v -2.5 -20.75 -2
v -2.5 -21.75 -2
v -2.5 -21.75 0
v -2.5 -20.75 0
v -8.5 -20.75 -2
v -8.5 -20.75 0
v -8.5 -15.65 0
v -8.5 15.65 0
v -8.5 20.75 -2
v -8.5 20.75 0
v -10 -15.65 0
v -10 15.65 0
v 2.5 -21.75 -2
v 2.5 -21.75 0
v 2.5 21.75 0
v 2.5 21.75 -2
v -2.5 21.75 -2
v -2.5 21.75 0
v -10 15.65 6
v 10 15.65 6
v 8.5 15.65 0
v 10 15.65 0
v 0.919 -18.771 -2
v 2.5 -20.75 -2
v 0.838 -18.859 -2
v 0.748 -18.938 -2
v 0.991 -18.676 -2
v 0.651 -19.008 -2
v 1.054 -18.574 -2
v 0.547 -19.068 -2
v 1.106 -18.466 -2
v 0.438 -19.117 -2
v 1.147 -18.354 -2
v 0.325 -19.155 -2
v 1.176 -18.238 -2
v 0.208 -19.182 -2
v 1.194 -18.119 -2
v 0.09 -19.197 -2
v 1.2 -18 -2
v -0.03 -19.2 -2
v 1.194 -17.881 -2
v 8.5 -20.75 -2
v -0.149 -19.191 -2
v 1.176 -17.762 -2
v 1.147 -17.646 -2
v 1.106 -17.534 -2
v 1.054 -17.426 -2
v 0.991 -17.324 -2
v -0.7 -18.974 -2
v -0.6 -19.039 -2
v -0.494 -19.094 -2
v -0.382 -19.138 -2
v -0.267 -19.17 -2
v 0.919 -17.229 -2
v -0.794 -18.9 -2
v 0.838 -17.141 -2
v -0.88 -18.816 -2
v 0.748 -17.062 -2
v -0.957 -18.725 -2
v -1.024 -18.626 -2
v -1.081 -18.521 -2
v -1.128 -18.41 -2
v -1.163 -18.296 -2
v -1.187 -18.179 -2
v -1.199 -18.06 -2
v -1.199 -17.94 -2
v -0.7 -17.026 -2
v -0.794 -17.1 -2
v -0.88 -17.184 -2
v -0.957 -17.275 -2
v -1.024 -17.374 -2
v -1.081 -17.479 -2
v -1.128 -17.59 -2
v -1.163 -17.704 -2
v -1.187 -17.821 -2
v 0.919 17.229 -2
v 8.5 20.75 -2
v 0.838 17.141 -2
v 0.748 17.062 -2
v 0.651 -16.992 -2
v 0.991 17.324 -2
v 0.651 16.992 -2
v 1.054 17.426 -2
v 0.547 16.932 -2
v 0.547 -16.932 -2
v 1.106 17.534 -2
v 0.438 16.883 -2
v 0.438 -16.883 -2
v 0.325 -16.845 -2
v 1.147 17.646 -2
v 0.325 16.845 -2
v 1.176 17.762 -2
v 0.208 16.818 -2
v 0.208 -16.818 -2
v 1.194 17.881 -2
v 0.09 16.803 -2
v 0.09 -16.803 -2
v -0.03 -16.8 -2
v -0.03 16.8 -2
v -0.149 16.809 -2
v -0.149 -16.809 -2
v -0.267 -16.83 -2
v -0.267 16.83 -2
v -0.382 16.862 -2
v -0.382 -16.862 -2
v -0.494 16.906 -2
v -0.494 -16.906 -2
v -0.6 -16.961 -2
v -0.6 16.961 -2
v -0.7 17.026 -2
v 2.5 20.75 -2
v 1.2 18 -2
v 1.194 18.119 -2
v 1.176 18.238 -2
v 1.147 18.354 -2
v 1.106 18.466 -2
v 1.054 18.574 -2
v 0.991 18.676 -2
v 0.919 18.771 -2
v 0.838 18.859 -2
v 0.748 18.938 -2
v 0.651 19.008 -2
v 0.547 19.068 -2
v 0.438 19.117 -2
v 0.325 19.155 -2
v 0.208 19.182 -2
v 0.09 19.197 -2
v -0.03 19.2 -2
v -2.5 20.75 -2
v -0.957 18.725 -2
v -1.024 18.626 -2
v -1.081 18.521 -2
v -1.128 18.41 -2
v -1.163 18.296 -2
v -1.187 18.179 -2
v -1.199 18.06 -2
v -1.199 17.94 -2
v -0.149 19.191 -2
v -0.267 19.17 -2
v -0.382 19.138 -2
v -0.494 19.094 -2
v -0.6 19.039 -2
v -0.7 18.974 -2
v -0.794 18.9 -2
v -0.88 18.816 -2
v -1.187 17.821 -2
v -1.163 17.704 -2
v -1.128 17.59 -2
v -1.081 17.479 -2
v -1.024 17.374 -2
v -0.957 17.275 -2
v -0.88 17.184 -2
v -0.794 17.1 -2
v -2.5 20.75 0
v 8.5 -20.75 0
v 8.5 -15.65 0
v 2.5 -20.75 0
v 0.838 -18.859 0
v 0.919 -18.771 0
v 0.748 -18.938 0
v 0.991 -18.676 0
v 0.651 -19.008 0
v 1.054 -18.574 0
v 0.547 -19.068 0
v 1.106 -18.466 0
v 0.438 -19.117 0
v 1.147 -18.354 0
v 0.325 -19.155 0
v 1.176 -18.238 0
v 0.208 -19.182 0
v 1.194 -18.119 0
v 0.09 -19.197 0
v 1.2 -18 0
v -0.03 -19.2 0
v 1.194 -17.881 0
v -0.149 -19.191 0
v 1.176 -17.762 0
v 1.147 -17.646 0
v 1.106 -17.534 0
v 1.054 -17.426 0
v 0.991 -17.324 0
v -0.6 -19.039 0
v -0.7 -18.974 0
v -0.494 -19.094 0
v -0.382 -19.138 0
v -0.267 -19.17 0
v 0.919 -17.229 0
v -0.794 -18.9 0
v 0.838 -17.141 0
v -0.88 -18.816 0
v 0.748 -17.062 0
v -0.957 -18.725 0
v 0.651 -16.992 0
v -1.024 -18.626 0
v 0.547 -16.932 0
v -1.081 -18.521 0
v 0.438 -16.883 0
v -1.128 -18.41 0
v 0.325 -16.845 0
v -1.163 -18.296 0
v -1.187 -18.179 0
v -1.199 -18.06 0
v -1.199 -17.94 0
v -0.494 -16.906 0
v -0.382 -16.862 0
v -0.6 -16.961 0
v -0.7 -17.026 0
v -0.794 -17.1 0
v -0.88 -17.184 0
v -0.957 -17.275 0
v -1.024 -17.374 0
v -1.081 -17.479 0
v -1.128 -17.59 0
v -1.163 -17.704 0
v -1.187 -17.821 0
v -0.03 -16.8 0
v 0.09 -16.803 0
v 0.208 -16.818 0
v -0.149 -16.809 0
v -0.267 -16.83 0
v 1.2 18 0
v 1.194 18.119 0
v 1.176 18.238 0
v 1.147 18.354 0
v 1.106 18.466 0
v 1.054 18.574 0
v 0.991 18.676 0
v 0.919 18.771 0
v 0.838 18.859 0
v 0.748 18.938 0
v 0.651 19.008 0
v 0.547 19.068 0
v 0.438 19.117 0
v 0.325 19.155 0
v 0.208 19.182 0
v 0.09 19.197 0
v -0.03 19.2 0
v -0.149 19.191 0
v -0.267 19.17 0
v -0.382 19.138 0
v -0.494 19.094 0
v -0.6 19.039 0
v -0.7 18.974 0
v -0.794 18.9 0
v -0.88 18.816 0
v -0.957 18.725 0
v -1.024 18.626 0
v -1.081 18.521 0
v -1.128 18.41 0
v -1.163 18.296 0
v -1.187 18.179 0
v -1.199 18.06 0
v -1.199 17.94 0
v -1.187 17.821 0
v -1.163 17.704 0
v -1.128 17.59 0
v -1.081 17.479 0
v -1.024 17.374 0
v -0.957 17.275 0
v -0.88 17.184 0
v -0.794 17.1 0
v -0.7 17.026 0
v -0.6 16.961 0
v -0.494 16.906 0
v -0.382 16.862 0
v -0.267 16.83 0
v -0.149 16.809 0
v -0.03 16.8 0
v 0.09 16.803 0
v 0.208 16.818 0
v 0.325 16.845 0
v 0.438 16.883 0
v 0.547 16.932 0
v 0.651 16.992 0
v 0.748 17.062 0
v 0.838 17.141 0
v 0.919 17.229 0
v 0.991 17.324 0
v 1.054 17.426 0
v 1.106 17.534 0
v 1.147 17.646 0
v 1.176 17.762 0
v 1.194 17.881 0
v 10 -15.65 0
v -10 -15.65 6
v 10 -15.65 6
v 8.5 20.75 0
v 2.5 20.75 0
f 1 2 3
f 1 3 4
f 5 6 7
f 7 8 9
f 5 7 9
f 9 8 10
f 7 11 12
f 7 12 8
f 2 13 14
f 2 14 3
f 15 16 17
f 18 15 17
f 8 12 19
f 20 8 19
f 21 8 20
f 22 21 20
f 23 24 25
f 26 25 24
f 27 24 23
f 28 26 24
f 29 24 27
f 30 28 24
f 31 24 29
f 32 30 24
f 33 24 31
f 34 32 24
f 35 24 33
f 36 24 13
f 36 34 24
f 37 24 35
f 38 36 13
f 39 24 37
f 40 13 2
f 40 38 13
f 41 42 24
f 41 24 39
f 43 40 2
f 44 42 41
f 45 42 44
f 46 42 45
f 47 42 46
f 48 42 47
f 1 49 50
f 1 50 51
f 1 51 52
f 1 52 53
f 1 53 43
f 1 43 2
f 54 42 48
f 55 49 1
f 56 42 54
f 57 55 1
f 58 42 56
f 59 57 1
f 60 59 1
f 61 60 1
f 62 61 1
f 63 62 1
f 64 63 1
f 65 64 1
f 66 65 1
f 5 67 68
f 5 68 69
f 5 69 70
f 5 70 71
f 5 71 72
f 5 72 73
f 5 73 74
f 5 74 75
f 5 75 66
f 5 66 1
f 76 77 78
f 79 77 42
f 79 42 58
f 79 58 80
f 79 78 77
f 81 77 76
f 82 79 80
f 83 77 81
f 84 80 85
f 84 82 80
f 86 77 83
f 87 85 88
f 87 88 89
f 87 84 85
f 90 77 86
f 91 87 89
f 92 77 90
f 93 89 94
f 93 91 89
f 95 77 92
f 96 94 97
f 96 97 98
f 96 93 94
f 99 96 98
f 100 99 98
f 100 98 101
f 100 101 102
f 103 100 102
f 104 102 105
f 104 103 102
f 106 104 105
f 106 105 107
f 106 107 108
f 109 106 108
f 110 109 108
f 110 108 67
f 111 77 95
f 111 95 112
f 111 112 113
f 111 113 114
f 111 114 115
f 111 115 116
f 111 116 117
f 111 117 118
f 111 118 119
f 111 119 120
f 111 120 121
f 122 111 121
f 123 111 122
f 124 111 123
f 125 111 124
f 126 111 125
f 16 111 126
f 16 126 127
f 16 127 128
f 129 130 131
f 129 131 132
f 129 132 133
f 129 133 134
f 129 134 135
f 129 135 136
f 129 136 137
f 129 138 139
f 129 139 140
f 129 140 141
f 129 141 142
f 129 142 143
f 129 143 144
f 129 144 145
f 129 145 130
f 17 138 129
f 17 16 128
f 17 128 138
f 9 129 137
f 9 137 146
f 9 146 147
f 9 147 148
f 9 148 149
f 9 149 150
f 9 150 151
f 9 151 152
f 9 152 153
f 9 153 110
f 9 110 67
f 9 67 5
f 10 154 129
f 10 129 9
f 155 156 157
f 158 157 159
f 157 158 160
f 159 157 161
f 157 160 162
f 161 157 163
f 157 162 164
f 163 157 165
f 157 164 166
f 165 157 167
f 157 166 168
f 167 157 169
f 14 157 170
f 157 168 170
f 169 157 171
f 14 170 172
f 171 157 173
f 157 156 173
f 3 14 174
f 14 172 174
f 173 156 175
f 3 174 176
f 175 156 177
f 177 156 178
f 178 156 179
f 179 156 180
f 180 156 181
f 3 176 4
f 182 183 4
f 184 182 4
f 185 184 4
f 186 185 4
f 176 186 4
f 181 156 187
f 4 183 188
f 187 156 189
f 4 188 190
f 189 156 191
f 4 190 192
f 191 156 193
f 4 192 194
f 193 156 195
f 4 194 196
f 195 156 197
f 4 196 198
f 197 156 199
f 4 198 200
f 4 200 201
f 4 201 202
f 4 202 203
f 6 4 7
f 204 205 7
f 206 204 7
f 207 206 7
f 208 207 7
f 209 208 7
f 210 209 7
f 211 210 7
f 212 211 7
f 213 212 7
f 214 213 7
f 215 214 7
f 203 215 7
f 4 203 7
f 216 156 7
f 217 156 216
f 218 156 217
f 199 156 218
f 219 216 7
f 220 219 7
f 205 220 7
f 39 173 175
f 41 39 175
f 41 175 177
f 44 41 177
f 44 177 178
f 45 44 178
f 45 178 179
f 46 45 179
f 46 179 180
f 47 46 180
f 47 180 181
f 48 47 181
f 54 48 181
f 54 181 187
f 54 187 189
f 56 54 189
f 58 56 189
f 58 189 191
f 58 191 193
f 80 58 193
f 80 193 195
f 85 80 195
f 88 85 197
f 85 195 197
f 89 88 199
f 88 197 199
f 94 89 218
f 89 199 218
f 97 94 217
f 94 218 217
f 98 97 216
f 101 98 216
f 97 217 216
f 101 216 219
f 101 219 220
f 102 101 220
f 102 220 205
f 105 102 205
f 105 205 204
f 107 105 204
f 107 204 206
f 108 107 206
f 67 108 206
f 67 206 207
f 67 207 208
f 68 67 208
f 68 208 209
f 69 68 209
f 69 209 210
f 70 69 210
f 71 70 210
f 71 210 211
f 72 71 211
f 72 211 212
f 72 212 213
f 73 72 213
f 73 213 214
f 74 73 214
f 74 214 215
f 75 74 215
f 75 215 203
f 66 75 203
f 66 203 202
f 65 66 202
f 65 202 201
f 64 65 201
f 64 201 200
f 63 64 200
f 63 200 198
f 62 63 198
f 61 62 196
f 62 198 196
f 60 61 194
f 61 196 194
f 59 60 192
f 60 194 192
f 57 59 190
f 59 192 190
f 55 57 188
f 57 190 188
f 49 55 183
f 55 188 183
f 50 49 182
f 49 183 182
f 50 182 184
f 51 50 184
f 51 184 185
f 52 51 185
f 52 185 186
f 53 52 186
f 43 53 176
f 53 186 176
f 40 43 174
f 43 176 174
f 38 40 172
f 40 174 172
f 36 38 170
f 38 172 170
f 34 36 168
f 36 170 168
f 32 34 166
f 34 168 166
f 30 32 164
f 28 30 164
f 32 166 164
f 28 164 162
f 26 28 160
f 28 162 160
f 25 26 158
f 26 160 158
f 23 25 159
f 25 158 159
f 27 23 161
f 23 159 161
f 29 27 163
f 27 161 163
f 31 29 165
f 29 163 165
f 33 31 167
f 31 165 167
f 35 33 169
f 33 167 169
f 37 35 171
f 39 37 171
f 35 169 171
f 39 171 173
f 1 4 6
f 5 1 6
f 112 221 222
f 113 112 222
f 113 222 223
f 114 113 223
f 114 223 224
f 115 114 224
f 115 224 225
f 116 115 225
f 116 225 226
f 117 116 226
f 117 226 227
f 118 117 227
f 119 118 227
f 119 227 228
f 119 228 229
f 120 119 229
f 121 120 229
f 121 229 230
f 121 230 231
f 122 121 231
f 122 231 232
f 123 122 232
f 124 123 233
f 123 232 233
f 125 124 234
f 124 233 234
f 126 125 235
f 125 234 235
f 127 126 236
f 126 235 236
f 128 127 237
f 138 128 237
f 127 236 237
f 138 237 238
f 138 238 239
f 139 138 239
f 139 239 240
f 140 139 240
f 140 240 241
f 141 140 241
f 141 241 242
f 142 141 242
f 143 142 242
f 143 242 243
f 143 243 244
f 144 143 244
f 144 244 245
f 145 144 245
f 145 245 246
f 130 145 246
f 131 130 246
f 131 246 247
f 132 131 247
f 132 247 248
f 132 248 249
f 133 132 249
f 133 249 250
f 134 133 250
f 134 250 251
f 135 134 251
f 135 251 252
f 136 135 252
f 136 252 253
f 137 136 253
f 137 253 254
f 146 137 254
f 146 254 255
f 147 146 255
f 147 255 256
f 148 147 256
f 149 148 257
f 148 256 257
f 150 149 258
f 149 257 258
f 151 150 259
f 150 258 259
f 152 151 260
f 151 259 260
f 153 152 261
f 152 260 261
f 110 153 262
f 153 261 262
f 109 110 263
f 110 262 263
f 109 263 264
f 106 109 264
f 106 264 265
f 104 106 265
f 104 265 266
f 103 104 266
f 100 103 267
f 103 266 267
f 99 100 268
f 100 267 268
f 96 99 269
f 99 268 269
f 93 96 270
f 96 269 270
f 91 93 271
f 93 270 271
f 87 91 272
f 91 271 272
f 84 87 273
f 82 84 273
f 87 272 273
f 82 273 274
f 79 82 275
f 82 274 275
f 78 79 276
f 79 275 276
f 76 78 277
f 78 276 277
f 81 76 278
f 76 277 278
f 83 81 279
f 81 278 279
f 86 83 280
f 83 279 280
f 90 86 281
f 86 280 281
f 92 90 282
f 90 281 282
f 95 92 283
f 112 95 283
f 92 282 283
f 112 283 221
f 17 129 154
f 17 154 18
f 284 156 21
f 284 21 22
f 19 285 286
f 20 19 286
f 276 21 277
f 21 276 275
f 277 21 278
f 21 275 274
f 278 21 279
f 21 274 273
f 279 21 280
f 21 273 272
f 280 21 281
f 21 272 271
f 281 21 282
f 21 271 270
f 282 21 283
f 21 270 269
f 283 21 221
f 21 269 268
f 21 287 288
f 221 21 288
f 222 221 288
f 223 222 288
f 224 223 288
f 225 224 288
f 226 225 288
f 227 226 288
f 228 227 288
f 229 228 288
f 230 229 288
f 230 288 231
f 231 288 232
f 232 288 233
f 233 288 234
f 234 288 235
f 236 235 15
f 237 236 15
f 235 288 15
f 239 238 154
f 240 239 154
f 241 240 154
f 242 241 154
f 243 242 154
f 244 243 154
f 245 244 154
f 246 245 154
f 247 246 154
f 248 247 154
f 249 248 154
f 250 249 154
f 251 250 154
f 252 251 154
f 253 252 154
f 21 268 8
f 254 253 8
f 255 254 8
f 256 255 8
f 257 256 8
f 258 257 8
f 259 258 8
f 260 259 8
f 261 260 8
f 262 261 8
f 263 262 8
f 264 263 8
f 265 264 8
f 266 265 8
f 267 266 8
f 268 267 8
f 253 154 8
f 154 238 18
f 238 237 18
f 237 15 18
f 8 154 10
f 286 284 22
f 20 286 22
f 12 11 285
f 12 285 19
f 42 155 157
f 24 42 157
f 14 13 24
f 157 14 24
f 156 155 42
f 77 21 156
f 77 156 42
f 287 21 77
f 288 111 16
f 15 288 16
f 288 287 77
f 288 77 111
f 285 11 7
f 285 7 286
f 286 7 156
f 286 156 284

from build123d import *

# Parameters (mm, degrees)
SKETCH1_W                = 20
SKETCH1_H                = 31.3
BOSS_EXTRUDE1_DEPTH      = 6
SKETCH2_W                = 17
SKETCH2_H                = 41.5
BOSS_EXTRUDE2_DEPTH      = 2
SKETCH3_W                = 5
SKETCH3_H                = 43.5
BOSS_EXTRUDE3_DEPTH      = 2
M2_CLEARANCE_HOLE1_D     = 2.4
M2_CLEARANCE_HOLE1_DEPTH = 2


with BuildPart() as part:
    # Sketch1 → Boss-Extrude1 (new body)
    with BuildSketch(Plane.XY):
        Rectangle(SKETCH1_W, SKETCH1_H)
    extrude(amount=BOSS_EXTRUDE1_DEPTH)

    # Sketch2 → Boss-Extrude2 (add)
    with BuildSketch(Plane(origin=(0, 0, 0), x_dir=(-1, 0, 0), z_dir=(0, 0, -1))):
        Rectangle(SKETCH2_W, SKETCH2_H)
    extrude(amount=BOSS_EXTRUDE2_DEPTH)

    # Sketch3 → Boss-Extrude3 (add)
    with BuildSketch(Plane(origin=(0, 0, -2), x_dir=(-1, 0, 0), z_dir=(0, 0, -1))):
        Rectangle(SKETCH3_W, SKETCH3_H)
    extrude(amount=-BOSS_EXTRUDE3_DEPTH)

    # M2 Clearance Hole1
    with Locations(Plane(origin=(0, 0, -2), x_dir=(-1, 0, 0), z_dir=(0, 0, -1))):
        with Locations((0, 18), (0, -18)):
            Hole(M2_CLEARANCE_HOLE1_D / 2, depth=M2_CLEARANCE_HOLE1_DEPTH)


solid = part.part
